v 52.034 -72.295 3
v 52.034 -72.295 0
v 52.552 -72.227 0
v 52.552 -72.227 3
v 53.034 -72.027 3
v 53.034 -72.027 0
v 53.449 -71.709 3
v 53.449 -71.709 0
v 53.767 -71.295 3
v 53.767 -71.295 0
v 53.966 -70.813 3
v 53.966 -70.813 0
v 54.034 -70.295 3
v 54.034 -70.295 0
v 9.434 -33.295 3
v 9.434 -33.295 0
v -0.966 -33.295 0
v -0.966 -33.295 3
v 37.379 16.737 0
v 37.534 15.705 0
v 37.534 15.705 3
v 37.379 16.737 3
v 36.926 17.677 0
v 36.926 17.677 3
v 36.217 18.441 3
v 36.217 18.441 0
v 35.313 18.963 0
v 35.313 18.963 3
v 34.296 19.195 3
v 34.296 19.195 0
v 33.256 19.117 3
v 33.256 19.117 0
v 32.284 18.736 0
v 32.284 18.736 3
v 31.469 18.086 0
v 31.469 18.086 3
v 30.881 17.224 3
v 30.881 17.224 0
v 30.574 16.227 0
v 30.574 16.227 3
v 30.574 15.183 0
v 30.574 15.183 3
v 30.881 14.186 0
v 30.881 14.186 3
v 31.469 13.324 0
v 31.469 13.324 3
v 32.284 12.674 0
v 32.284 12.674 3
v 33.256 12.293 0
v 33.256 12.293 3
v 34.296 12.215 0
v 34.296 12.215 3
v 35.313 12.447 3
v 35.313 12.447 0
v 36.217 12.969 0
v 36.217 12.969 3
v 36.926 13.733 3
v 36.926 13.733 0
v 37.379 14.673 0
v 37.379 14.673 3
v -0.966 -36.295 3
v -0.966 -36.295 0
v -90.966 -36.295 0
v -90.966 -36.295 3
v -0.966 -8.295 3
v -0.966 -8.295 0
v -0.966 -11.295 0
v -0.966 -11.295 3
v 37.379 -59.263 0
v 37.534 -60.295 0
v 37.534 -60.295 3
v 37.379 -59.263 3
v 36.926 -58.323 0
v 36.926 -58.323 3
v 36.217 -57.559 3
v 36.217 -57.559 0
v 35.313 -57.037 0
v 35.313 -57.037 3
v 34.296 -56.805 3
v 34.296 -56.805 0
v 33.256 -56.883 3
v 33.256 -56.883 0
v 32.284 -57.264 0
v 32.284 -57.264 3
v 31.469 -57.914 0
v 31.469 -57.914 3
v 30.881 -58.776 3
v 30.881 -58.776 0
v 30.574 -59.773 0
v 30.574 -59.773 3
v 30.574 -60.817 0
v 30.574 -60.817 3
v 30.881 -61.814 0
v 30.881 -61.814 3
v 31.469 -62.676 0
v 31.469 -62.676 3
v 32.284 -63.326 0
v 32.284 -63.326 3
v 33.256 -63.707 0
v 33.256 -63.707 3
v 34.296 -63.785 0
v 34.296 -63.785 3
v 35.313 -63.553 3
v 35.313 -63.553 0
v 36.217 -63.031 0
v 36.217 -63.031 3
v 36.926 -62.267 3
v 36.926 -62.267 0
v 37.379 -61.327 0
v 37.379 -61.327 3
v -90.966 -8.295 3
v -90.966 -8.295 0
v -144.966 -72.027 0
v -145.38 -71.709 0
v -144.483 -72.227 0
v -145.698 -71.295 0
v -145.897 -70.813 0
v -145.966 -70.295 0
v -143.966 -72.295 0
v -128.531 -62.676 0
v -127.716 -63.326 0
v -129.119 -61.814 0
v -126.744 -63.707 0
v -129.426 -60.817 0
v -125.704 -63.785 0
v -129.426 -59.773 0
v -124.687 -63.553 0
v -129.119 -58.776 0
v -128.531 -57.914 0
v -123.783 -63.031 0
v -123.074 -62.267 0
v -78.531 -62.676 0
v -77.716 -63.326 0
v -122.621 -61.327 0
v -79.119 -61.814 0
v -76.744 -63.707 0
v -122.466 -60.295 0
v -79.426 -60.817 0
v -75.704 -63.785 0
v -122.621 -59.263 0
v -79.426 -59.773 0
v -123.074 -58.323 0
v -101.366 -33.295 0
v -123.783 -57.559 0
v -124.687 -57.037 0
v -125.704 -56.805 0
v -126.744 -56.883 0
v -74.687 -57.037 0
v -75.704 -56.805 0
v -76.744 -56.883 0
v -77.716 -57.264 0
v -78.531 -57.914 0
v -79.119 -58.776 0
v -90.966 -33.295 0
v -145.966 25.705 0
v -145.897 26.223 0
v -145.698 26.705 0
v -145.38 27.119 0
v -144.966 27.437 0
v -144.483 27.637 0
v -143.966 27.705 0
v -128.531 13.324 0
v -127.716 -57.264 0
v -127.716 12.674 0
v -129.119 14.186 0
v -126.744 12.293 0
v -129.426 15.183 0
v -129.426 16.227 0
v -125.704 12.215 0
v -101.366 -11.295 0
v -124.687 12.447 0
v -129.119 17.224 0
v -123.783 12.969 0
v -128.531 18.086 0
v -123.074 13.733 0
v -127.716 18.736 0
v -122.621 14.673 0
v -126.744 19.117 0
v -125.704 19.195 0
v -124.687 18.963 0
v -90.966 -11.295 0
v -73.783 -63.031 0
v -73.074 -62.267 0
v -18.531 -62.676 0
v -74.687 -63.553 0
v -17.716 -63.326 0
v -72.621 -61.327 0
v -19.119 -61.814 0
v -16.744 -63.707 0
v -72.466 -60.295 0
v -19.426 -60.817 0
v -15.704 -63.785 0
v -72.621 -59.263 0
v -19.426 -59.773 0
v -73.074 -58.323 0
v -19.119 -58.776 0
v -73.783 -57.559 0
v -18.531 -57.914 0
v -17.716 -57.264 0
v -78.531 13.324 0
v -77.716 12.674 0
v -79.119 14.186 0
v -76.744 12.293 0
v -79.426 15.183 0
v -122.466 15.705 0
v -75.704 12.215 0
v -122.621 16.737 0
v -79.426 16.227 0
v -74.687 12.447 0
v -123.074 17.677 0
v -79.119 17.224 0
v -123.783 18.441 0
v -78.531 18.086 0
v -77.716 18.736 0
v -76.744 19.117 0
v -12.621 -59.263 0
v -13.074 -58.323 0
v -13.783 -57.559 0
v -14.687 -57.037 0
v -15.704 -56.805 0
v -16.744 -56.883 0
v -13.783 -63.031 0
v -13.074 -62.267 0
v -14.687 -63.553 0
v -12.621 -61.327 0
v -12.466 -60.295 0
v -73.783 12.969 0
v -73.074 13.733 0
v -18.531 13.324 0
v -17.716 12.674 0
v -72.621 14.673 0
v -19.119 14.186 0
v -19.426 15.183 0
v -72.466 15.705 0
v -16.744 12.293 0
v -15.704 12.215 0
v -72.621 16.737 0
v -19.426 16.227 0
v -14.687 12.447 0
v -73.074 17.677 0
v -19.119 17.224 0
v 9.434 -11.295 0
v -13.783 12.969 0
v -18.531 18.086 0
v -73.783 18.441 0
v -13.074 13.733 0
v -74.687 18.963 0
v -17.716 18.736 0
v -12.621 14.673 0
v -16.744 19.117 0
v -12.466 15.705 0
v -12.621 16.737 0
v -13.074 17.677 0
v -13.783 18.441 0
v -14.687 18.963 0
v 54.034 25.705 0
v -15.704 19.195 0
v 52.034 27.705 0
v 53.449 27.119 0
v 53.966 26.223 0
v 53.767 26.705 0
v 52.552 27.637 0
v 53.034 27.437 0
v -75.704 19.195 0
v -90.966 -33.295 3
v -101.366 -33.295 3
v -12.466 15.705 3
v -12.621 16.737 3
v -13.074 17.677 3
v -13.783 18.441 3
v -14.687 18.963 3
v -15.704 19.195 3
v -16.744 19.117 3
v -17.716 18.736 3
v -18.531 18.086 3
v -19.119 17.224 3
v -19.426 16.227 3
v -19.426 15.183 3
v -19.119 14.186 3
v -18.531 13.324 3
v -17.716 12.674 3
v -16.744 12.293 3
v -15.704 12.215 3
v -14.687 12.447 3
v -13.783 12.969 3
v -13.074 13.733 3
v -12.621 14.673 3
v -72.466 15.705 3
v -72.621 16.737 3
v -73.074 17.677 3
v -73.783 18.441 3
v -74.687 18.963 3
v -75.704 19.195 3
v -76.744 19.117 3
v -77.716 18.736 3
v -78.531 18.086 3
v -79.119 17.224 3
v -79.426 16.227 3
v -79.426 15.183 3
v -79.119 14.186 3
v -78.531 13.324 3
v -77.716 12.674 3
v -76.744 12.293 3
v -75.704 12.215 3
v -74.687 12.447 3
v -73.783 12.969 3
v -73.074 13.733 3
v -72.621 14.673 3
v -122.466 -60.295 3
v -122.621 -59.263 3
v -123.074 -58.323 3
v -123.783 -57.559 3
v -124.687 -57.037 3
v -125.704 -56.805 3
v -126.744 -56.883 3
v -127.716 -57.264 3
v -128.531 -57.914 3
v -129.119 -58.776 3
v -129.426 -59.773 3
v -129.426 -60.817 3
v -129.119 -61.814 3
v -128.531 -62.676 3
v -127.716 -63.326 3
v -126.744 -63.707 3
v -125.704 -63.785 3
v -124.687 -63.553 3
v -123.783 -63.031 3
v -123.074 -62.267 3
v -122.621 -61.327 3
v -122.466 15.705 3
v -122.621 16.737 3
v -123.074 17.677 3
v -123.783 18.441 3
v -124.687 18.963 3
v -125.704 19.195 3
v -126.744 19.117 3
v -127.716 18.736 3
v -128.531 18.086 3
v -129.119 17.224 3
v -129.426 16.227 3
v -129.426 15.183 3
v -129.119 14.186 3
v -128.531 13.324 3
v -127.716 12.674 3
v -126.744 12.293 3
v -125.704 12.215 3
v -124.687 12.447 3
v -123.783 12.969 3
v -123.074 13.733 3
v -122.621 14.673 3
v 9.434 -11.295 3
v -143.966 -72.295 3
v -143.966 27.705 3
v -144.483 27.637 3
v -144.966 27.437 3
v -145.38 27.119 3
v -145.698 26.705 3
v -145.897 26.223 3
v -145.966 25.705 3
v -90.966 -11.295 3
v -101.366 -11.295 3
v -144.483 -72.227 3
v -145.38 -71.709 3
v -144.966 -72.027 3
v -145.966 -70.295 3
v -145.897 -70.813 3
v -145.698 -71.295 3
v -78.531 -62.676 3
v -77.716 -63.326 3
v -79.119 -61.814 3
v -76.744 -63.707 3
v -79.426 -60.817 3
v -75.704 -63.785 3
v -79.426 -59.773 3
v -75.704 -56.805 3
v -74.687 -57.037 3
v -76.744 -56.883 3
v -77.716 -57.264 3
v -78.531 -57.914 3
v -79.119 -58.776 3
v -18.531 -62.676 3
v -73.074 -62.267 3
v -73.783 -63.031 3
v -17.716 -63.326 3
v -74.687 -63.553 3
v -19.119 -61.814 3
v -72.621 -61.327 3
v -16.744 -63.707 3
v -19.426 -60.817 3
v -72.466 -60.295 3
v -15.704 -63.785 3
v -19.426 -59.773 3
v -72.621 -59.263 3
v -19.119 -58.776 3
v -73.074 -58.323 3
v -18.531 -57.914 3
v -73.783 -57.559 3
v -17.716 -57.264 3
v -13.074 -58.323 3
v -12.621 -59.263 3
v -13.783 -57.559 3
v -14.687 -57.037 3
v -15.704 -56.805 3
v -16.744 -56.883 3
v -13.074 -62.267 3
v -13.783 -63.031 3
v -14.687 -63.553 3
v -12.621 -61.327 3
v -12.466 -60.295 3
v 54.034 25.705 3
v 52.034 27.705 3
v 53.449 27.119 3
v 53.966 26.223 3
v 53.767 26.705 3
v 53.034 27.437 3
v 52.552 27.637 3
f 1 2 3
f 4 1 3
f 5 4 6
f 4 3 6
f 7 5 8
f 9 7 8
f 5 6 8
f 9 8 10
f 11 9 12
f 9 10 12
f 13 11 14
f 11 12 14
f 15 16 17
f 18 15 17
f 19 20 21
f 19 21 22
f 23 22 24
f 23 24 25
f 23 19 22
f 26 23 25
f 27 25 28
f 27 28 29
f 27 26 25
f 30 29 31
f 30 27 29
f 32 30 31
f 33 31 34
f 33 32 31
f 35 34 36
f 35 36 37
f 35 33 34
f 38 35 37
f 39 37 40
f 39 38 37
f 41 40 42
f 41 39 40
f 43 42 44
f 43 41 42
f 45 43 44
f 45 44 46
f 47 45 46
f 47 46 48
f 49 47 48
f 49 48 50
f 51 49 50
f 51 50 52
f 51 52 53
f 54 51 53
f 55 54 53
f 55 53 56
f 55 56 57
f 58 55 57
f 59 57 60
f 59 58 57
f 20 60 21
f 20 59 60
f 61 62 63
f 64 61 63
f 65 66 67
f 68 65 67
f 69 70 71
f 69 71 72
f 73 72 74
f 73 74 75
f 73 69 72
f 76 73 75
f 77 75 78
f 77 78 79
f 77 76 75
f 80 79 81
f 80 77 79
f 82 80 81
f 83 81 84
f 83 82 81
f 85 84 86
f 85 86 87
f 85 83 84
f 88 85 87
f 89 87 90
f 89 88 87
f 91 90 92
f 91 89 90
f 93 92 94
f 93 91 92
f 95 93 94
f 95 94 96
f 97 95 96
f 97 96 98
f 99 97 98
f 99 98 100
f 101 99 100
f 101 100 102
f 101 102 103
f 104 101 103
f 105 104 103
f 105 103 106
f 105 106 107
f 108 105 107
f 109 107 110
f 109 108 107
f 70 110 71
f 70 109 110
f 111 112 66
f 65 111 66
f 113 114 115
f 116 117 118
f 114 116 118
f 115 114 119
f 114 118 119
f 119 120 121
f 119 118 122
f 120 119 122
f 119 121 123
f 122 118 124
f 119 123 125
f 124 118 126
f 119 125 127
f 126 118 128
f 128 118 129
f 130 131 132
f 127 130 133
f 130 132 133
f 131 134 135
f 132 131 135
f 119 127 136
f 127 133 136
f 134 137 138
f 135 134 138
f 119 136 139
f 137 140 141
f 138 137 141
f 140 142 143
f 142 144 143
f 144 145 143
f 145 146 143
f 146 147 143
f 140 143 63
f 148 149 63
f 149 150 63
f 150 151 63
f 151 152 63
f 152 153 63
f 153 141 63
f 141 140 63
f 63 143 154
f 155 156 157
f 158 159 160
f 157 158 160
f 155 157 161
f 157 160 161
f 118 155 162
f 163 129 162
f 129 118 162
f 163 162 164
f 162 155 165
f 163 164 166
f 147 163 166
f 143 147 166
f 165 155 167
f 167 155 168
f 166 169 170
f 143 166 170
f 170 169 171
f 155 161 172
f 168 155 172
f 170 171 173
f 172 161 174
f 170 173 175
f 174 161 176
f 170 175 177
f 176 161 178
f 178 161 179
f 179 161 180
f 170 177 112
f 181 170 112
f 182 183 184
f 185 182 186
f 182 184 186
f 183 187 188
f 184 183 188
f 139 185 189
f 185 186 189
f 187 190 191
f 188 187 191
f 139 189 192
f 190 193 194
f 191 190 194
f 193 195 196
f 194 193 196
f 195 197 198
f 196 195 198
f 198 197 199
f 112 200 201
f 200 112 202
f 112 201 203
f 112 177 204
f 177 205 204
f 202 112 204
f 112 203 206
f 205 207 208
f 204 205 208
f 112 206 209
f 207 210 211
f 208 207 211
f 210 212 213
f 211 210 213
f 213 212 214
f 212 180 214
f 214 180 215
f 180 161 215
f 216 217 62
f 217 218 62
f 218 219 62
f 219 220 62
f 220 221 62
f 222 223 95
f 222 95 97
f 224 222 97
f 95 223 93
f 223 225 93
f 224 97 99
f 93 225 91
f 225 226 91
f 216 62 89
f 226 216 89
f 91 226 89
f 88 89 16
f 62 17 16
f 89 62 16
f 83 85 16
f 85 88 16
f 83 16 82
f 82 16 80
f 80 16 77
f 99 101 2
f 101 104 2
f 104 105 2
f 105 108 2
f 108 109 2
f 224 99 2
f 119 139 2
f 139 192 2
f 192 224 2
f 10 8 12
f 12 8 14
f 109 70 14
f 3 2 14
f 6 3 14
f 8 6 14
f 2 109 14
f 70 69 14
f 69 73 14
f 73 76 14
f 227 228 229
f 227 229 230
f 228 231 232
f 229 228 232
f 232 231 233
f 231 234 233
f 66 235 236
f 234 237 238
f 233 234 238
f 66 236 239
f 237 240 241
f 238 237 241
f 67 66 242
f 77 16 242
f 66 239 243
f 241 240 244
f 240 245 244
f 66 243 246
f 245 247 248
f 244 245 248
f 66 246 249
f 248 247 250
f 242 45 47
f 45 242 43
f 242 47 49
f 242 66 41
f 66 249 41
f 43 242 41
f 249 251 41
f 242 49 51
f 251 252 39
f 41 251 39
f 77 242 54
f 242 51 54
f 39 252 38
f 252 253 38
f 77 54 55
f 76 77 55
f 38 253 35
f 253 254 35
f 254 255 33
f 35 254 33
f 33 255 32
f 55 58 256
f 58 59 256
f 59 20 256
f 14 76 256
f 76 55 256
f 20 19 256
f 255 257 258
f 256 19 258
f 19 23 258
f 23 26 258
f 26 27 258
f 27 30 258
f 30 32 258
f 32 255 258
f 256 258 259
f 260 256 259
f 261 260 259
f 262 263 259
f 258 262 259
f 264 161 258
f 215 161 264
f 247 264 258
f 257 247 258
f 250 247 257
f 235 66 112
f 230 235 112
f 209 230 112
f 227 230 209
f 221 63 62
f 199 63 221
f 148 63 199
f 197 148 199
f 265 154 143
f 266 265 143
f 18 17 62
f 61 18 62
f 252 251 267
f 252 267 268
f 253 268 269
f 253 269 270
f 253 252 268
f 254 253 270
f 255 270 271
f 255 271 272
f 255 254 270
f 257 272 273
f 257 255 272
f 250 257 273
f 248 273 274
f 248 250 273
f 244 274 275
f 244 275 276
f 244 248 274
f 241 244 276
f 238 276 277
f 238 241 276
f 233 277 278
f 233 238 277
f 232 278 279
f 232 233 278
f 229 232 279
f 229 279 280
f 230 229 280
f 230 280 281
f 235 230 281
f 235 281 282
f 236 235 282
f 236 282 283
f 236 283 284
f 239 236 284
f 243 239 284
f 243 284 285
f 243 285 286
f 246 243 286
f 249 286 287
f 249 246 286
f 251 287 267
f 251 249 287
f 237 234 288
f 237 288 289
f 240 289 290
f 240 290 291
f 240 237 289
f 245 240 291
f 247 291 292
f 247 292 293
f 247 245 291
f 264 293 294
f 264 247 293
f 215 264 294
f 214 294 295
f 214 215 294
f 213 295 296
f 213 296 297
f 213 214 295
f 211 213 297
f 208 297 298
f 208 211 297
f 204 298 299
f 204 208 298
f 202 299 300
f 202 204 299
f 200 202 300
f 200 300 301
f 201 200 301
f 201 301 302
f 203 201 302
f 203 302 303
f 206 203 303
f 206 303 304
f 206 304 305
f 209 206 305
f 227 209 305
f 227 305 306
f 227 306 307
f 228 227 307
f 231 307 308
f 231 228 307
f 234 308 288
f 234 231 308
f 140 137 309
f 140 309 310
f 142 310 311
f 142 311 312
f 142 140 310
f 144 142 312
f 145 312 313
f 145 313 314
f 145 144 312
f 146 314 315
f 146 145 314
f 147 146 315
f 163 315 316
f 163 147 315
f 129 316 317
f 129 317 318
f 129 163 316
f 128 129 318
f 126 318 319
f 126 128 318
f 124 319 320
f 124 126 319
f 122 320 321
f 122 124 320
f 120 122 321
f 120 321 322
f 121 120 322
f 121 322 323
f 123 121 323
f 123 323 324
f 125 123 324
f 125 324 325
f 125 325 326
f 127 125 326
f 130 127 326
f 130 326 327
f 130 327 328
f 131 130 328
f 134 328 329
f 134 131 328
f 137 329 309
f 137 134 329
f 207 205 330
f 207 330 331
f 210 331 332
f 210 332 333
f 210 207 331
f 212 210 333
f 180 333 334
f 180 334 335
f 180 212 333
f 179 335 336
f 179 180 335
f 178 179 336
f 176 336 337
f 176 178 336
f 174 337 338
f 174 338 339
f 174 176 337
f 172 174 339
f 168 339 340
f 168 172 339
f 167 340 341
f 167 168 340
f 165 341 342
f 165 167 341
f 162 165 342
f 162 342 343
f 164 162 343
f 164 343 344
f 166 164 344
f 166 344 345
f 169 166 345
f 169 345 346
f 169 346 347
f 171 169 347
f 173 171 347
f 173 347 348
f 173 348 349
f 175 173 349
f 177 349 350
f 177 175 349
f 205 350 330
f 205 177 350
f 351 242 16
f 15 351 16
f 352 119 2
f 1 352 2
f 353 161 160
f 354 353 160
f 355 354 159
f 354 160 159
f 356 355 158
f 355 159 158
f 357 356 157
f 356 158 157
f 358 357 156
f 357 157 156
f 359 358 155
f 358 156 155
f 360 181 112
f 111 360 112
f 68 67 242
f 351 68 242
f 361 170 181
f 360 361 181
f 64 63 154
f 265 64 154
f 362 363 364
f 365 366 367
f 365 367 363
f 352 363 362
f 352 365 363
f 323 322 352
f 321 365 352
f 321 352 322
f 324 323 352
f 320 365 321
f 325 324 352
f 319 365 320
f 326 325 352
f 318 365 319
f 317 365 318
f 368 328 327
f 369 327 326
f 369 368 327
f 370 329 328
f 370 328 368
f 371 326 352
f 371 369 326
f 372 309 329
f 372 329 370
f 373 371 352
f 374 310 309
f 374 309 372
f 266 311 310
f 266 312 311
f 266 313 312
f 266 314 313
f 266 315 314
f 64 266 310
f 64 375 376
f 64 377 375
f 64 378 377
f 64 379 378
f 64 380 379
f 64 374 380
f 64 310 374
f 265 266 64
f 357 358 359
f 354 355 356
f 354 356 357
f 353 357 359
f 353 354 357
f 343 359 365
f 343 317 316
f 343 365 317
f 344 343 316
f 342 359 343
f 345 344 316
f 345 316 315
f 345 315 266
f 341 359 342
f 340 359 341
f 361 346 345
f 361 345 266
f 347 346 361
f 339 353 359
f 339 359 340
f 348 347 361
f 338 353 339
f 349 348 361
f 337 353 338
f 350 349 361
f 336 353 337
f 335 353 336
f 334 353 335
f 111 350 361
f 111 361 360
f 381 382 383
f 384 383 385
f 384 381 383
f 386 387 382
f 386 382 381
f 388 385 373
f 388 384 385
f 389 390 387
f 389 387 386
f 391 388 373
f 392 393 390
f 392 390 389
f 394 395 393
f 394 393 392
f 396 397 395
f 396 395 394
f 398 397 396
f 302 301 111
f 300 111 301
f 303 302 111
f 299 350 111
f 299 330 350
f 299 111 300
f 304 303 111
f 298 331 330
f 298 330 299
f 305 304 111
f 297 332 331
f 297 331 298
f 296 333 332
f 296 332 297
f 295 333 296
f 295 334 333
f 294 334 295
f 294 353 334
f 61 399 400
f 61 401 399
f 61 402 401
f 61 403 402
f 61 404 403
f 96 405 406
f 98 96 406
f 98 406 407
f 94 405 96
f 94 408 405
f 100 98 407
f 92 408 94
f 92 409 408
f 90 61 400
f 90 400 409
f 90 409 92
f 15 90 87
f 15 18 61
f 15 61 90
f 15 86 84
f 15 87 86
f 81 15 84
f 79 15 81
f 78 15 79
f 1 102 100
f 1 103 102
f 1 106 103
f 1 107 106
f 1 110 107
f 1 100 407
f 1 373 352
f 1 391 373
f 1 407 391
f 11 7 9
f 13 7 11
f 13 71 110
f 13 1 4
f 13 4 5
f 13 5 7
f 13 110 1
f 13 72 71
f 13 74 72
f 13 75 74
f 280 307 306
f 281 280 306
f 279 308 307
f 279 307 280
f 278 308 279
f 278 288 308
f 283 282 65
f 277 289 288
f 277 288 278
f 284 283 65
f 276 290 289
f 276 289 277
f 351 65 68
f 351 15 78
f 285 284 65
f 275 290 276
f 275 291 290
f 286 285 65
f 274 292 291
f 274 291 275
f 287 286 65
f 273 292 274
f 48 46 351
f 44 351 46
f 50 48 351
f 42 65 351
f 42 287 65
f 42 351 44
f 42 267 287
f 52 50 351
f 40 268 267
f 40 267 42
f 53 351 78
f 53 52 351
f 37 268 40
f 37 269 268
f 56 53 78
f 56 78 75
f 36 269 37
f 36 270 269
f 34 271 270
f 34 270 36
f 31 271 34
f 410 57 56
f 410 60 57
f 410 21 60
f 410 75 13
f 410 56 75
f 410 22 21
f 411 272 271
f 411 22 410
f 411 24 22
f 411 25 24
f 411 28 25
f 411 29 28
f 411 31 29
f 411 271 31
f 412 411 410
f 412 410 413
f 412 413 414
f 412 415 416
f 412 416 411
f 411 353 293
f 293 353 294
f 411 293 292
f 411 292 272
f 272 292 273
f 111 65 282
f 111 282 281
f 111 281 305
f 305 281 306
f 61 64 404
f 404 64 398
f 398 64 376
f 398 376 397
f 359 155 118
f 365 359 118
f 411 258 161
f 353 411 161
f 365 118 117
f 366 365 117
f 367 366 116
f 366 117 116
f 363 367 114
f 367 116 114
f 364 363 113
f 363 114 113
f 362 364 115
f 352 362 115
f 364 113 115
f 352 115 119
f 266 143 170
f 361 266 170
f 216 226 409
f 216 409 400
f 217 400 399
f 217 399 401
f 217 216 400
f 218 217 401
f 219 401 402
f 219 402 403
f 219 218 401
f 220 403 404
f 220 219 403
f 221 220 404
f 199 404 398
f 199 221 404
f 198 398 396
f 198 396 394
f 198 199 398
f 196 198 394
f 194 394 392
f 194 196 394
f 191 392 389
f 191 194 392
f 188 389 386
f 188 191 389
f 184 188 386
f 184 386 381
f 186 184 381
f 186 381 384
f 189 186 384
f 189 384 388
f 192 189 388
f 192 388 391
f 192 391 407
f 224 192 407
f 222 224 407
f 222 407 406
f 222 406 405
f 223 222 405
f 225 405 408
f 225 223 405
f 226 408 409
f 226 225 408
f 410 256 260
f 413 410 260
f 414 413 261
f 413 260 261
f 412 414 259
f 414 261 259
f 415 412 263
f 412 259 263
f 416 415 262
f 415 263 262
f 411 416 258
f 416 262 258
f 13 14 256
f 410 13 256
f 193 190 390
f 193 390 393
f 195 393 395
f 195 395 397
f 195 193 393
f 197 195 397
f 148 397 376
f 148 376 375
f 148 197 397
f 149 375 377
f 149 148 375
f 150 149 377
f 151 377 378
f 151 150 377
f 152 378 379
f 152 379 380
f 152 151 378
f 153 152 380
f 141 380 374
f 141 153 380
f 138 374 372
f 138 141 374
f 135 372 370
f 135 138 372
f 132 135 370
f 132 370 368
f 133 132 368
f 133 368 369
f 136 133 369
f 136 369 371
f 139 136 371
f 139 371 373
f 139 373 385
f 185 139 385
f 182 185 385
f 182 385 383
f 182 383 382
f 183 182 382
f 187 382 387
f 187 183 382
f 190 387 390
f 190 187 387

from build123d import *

# Parameters (mm, degrees)
F0_R     = 3.5
F1_DEPTH = 3


with BuildPart() as f1:
    # F0 (on Top) → F1 (new body)
    with BuildSketch(Plane.XY):
        with BuildLine():
            Line((-125.965531, 27.705068), (-143.965531, 27.705068))
            ThreePointArc((-143.965531, 27.705068), (-145.379745, 27.119281), (-145.965531, 25.705068))
            Line((-145.965531, 25.705068), (-145.965531, -70.294932))
            ThreePointArc((-145.965531, -70.294932), (-145.379745, -71.709146), (-143.965531, -72.294932))
            Line((-143.965531, -72.294932), (52.034469, -72.294932))
            ThreePointArc((52.034469, -72.294932), (53.448682, -71.709146), (54.034469, -70.294932))
            Line((54.034469, -70.294932), (54.034469, 25.705068))
            ThreePointArc((54.034469, 25.705068), (53.448682, 27.119281), (52.034469, 27.705068))
            Line((52.034469, 27.705068), (34.034469, 27.705068))
            Line((34.034469, 27.705068), (-15.965531, 27.705068))
            Line((-15.965531, 27.705068), (-75.965531, 27.705068))
            Line((-75.965531, 27.705068), (-125.965531, 27.705068))
        make_face()
        with Locations((-125.965531, -60.294932)):
            Circle(F0_R, mode=Mode.SUBTRACT)
        with Locations((-75.965531, -60.294932)):
            Circle(F0_R, mode=Mode.SUBTRACT)
        with Locations((-15.965531, -60.294932)):
            Circle(F0_R, mode=Mode.SUBTRACT)
        with Locations((34.034469, -60.294932)):
            Circle(F0_R, mode=Mode.SUBTRACT)
        Polygon((-90.965531, -11.294932), (-90.965531, -8.294932), (-0.965531, -8.294932), (-0.965531, -11.294932), (9.434469, -11.294932), (9.434469, -33.294932), (-0.965531, -33.294932), (-0.965531, -36.294932), (-90.965531, -36.294932), (-90.965531, -33.294932), (-101.365531, -33.294932), (-101.365531, -11.294932), align=None, mode=Mode.SUBTRACT)
        with Locations((-125.965531, 15.705068)):
            Circle(F0_R, mode=Mode.SUBTRACT)
        with Locations((-75.965531, 15.705068)):
            Circle(F0_R, mode=Mode.SUBTRACT)
        with Locations((-15.965531, 15.705068)):
            Circle(F0_R, mode=Mode.SUBTRACT)
        with Locations((34.034469, 15.705068)):
            Circle(F0_R, mode=Mode.SUBTRACT)
    extrude(amount=F1_DEPTH)


solid = f1.part
